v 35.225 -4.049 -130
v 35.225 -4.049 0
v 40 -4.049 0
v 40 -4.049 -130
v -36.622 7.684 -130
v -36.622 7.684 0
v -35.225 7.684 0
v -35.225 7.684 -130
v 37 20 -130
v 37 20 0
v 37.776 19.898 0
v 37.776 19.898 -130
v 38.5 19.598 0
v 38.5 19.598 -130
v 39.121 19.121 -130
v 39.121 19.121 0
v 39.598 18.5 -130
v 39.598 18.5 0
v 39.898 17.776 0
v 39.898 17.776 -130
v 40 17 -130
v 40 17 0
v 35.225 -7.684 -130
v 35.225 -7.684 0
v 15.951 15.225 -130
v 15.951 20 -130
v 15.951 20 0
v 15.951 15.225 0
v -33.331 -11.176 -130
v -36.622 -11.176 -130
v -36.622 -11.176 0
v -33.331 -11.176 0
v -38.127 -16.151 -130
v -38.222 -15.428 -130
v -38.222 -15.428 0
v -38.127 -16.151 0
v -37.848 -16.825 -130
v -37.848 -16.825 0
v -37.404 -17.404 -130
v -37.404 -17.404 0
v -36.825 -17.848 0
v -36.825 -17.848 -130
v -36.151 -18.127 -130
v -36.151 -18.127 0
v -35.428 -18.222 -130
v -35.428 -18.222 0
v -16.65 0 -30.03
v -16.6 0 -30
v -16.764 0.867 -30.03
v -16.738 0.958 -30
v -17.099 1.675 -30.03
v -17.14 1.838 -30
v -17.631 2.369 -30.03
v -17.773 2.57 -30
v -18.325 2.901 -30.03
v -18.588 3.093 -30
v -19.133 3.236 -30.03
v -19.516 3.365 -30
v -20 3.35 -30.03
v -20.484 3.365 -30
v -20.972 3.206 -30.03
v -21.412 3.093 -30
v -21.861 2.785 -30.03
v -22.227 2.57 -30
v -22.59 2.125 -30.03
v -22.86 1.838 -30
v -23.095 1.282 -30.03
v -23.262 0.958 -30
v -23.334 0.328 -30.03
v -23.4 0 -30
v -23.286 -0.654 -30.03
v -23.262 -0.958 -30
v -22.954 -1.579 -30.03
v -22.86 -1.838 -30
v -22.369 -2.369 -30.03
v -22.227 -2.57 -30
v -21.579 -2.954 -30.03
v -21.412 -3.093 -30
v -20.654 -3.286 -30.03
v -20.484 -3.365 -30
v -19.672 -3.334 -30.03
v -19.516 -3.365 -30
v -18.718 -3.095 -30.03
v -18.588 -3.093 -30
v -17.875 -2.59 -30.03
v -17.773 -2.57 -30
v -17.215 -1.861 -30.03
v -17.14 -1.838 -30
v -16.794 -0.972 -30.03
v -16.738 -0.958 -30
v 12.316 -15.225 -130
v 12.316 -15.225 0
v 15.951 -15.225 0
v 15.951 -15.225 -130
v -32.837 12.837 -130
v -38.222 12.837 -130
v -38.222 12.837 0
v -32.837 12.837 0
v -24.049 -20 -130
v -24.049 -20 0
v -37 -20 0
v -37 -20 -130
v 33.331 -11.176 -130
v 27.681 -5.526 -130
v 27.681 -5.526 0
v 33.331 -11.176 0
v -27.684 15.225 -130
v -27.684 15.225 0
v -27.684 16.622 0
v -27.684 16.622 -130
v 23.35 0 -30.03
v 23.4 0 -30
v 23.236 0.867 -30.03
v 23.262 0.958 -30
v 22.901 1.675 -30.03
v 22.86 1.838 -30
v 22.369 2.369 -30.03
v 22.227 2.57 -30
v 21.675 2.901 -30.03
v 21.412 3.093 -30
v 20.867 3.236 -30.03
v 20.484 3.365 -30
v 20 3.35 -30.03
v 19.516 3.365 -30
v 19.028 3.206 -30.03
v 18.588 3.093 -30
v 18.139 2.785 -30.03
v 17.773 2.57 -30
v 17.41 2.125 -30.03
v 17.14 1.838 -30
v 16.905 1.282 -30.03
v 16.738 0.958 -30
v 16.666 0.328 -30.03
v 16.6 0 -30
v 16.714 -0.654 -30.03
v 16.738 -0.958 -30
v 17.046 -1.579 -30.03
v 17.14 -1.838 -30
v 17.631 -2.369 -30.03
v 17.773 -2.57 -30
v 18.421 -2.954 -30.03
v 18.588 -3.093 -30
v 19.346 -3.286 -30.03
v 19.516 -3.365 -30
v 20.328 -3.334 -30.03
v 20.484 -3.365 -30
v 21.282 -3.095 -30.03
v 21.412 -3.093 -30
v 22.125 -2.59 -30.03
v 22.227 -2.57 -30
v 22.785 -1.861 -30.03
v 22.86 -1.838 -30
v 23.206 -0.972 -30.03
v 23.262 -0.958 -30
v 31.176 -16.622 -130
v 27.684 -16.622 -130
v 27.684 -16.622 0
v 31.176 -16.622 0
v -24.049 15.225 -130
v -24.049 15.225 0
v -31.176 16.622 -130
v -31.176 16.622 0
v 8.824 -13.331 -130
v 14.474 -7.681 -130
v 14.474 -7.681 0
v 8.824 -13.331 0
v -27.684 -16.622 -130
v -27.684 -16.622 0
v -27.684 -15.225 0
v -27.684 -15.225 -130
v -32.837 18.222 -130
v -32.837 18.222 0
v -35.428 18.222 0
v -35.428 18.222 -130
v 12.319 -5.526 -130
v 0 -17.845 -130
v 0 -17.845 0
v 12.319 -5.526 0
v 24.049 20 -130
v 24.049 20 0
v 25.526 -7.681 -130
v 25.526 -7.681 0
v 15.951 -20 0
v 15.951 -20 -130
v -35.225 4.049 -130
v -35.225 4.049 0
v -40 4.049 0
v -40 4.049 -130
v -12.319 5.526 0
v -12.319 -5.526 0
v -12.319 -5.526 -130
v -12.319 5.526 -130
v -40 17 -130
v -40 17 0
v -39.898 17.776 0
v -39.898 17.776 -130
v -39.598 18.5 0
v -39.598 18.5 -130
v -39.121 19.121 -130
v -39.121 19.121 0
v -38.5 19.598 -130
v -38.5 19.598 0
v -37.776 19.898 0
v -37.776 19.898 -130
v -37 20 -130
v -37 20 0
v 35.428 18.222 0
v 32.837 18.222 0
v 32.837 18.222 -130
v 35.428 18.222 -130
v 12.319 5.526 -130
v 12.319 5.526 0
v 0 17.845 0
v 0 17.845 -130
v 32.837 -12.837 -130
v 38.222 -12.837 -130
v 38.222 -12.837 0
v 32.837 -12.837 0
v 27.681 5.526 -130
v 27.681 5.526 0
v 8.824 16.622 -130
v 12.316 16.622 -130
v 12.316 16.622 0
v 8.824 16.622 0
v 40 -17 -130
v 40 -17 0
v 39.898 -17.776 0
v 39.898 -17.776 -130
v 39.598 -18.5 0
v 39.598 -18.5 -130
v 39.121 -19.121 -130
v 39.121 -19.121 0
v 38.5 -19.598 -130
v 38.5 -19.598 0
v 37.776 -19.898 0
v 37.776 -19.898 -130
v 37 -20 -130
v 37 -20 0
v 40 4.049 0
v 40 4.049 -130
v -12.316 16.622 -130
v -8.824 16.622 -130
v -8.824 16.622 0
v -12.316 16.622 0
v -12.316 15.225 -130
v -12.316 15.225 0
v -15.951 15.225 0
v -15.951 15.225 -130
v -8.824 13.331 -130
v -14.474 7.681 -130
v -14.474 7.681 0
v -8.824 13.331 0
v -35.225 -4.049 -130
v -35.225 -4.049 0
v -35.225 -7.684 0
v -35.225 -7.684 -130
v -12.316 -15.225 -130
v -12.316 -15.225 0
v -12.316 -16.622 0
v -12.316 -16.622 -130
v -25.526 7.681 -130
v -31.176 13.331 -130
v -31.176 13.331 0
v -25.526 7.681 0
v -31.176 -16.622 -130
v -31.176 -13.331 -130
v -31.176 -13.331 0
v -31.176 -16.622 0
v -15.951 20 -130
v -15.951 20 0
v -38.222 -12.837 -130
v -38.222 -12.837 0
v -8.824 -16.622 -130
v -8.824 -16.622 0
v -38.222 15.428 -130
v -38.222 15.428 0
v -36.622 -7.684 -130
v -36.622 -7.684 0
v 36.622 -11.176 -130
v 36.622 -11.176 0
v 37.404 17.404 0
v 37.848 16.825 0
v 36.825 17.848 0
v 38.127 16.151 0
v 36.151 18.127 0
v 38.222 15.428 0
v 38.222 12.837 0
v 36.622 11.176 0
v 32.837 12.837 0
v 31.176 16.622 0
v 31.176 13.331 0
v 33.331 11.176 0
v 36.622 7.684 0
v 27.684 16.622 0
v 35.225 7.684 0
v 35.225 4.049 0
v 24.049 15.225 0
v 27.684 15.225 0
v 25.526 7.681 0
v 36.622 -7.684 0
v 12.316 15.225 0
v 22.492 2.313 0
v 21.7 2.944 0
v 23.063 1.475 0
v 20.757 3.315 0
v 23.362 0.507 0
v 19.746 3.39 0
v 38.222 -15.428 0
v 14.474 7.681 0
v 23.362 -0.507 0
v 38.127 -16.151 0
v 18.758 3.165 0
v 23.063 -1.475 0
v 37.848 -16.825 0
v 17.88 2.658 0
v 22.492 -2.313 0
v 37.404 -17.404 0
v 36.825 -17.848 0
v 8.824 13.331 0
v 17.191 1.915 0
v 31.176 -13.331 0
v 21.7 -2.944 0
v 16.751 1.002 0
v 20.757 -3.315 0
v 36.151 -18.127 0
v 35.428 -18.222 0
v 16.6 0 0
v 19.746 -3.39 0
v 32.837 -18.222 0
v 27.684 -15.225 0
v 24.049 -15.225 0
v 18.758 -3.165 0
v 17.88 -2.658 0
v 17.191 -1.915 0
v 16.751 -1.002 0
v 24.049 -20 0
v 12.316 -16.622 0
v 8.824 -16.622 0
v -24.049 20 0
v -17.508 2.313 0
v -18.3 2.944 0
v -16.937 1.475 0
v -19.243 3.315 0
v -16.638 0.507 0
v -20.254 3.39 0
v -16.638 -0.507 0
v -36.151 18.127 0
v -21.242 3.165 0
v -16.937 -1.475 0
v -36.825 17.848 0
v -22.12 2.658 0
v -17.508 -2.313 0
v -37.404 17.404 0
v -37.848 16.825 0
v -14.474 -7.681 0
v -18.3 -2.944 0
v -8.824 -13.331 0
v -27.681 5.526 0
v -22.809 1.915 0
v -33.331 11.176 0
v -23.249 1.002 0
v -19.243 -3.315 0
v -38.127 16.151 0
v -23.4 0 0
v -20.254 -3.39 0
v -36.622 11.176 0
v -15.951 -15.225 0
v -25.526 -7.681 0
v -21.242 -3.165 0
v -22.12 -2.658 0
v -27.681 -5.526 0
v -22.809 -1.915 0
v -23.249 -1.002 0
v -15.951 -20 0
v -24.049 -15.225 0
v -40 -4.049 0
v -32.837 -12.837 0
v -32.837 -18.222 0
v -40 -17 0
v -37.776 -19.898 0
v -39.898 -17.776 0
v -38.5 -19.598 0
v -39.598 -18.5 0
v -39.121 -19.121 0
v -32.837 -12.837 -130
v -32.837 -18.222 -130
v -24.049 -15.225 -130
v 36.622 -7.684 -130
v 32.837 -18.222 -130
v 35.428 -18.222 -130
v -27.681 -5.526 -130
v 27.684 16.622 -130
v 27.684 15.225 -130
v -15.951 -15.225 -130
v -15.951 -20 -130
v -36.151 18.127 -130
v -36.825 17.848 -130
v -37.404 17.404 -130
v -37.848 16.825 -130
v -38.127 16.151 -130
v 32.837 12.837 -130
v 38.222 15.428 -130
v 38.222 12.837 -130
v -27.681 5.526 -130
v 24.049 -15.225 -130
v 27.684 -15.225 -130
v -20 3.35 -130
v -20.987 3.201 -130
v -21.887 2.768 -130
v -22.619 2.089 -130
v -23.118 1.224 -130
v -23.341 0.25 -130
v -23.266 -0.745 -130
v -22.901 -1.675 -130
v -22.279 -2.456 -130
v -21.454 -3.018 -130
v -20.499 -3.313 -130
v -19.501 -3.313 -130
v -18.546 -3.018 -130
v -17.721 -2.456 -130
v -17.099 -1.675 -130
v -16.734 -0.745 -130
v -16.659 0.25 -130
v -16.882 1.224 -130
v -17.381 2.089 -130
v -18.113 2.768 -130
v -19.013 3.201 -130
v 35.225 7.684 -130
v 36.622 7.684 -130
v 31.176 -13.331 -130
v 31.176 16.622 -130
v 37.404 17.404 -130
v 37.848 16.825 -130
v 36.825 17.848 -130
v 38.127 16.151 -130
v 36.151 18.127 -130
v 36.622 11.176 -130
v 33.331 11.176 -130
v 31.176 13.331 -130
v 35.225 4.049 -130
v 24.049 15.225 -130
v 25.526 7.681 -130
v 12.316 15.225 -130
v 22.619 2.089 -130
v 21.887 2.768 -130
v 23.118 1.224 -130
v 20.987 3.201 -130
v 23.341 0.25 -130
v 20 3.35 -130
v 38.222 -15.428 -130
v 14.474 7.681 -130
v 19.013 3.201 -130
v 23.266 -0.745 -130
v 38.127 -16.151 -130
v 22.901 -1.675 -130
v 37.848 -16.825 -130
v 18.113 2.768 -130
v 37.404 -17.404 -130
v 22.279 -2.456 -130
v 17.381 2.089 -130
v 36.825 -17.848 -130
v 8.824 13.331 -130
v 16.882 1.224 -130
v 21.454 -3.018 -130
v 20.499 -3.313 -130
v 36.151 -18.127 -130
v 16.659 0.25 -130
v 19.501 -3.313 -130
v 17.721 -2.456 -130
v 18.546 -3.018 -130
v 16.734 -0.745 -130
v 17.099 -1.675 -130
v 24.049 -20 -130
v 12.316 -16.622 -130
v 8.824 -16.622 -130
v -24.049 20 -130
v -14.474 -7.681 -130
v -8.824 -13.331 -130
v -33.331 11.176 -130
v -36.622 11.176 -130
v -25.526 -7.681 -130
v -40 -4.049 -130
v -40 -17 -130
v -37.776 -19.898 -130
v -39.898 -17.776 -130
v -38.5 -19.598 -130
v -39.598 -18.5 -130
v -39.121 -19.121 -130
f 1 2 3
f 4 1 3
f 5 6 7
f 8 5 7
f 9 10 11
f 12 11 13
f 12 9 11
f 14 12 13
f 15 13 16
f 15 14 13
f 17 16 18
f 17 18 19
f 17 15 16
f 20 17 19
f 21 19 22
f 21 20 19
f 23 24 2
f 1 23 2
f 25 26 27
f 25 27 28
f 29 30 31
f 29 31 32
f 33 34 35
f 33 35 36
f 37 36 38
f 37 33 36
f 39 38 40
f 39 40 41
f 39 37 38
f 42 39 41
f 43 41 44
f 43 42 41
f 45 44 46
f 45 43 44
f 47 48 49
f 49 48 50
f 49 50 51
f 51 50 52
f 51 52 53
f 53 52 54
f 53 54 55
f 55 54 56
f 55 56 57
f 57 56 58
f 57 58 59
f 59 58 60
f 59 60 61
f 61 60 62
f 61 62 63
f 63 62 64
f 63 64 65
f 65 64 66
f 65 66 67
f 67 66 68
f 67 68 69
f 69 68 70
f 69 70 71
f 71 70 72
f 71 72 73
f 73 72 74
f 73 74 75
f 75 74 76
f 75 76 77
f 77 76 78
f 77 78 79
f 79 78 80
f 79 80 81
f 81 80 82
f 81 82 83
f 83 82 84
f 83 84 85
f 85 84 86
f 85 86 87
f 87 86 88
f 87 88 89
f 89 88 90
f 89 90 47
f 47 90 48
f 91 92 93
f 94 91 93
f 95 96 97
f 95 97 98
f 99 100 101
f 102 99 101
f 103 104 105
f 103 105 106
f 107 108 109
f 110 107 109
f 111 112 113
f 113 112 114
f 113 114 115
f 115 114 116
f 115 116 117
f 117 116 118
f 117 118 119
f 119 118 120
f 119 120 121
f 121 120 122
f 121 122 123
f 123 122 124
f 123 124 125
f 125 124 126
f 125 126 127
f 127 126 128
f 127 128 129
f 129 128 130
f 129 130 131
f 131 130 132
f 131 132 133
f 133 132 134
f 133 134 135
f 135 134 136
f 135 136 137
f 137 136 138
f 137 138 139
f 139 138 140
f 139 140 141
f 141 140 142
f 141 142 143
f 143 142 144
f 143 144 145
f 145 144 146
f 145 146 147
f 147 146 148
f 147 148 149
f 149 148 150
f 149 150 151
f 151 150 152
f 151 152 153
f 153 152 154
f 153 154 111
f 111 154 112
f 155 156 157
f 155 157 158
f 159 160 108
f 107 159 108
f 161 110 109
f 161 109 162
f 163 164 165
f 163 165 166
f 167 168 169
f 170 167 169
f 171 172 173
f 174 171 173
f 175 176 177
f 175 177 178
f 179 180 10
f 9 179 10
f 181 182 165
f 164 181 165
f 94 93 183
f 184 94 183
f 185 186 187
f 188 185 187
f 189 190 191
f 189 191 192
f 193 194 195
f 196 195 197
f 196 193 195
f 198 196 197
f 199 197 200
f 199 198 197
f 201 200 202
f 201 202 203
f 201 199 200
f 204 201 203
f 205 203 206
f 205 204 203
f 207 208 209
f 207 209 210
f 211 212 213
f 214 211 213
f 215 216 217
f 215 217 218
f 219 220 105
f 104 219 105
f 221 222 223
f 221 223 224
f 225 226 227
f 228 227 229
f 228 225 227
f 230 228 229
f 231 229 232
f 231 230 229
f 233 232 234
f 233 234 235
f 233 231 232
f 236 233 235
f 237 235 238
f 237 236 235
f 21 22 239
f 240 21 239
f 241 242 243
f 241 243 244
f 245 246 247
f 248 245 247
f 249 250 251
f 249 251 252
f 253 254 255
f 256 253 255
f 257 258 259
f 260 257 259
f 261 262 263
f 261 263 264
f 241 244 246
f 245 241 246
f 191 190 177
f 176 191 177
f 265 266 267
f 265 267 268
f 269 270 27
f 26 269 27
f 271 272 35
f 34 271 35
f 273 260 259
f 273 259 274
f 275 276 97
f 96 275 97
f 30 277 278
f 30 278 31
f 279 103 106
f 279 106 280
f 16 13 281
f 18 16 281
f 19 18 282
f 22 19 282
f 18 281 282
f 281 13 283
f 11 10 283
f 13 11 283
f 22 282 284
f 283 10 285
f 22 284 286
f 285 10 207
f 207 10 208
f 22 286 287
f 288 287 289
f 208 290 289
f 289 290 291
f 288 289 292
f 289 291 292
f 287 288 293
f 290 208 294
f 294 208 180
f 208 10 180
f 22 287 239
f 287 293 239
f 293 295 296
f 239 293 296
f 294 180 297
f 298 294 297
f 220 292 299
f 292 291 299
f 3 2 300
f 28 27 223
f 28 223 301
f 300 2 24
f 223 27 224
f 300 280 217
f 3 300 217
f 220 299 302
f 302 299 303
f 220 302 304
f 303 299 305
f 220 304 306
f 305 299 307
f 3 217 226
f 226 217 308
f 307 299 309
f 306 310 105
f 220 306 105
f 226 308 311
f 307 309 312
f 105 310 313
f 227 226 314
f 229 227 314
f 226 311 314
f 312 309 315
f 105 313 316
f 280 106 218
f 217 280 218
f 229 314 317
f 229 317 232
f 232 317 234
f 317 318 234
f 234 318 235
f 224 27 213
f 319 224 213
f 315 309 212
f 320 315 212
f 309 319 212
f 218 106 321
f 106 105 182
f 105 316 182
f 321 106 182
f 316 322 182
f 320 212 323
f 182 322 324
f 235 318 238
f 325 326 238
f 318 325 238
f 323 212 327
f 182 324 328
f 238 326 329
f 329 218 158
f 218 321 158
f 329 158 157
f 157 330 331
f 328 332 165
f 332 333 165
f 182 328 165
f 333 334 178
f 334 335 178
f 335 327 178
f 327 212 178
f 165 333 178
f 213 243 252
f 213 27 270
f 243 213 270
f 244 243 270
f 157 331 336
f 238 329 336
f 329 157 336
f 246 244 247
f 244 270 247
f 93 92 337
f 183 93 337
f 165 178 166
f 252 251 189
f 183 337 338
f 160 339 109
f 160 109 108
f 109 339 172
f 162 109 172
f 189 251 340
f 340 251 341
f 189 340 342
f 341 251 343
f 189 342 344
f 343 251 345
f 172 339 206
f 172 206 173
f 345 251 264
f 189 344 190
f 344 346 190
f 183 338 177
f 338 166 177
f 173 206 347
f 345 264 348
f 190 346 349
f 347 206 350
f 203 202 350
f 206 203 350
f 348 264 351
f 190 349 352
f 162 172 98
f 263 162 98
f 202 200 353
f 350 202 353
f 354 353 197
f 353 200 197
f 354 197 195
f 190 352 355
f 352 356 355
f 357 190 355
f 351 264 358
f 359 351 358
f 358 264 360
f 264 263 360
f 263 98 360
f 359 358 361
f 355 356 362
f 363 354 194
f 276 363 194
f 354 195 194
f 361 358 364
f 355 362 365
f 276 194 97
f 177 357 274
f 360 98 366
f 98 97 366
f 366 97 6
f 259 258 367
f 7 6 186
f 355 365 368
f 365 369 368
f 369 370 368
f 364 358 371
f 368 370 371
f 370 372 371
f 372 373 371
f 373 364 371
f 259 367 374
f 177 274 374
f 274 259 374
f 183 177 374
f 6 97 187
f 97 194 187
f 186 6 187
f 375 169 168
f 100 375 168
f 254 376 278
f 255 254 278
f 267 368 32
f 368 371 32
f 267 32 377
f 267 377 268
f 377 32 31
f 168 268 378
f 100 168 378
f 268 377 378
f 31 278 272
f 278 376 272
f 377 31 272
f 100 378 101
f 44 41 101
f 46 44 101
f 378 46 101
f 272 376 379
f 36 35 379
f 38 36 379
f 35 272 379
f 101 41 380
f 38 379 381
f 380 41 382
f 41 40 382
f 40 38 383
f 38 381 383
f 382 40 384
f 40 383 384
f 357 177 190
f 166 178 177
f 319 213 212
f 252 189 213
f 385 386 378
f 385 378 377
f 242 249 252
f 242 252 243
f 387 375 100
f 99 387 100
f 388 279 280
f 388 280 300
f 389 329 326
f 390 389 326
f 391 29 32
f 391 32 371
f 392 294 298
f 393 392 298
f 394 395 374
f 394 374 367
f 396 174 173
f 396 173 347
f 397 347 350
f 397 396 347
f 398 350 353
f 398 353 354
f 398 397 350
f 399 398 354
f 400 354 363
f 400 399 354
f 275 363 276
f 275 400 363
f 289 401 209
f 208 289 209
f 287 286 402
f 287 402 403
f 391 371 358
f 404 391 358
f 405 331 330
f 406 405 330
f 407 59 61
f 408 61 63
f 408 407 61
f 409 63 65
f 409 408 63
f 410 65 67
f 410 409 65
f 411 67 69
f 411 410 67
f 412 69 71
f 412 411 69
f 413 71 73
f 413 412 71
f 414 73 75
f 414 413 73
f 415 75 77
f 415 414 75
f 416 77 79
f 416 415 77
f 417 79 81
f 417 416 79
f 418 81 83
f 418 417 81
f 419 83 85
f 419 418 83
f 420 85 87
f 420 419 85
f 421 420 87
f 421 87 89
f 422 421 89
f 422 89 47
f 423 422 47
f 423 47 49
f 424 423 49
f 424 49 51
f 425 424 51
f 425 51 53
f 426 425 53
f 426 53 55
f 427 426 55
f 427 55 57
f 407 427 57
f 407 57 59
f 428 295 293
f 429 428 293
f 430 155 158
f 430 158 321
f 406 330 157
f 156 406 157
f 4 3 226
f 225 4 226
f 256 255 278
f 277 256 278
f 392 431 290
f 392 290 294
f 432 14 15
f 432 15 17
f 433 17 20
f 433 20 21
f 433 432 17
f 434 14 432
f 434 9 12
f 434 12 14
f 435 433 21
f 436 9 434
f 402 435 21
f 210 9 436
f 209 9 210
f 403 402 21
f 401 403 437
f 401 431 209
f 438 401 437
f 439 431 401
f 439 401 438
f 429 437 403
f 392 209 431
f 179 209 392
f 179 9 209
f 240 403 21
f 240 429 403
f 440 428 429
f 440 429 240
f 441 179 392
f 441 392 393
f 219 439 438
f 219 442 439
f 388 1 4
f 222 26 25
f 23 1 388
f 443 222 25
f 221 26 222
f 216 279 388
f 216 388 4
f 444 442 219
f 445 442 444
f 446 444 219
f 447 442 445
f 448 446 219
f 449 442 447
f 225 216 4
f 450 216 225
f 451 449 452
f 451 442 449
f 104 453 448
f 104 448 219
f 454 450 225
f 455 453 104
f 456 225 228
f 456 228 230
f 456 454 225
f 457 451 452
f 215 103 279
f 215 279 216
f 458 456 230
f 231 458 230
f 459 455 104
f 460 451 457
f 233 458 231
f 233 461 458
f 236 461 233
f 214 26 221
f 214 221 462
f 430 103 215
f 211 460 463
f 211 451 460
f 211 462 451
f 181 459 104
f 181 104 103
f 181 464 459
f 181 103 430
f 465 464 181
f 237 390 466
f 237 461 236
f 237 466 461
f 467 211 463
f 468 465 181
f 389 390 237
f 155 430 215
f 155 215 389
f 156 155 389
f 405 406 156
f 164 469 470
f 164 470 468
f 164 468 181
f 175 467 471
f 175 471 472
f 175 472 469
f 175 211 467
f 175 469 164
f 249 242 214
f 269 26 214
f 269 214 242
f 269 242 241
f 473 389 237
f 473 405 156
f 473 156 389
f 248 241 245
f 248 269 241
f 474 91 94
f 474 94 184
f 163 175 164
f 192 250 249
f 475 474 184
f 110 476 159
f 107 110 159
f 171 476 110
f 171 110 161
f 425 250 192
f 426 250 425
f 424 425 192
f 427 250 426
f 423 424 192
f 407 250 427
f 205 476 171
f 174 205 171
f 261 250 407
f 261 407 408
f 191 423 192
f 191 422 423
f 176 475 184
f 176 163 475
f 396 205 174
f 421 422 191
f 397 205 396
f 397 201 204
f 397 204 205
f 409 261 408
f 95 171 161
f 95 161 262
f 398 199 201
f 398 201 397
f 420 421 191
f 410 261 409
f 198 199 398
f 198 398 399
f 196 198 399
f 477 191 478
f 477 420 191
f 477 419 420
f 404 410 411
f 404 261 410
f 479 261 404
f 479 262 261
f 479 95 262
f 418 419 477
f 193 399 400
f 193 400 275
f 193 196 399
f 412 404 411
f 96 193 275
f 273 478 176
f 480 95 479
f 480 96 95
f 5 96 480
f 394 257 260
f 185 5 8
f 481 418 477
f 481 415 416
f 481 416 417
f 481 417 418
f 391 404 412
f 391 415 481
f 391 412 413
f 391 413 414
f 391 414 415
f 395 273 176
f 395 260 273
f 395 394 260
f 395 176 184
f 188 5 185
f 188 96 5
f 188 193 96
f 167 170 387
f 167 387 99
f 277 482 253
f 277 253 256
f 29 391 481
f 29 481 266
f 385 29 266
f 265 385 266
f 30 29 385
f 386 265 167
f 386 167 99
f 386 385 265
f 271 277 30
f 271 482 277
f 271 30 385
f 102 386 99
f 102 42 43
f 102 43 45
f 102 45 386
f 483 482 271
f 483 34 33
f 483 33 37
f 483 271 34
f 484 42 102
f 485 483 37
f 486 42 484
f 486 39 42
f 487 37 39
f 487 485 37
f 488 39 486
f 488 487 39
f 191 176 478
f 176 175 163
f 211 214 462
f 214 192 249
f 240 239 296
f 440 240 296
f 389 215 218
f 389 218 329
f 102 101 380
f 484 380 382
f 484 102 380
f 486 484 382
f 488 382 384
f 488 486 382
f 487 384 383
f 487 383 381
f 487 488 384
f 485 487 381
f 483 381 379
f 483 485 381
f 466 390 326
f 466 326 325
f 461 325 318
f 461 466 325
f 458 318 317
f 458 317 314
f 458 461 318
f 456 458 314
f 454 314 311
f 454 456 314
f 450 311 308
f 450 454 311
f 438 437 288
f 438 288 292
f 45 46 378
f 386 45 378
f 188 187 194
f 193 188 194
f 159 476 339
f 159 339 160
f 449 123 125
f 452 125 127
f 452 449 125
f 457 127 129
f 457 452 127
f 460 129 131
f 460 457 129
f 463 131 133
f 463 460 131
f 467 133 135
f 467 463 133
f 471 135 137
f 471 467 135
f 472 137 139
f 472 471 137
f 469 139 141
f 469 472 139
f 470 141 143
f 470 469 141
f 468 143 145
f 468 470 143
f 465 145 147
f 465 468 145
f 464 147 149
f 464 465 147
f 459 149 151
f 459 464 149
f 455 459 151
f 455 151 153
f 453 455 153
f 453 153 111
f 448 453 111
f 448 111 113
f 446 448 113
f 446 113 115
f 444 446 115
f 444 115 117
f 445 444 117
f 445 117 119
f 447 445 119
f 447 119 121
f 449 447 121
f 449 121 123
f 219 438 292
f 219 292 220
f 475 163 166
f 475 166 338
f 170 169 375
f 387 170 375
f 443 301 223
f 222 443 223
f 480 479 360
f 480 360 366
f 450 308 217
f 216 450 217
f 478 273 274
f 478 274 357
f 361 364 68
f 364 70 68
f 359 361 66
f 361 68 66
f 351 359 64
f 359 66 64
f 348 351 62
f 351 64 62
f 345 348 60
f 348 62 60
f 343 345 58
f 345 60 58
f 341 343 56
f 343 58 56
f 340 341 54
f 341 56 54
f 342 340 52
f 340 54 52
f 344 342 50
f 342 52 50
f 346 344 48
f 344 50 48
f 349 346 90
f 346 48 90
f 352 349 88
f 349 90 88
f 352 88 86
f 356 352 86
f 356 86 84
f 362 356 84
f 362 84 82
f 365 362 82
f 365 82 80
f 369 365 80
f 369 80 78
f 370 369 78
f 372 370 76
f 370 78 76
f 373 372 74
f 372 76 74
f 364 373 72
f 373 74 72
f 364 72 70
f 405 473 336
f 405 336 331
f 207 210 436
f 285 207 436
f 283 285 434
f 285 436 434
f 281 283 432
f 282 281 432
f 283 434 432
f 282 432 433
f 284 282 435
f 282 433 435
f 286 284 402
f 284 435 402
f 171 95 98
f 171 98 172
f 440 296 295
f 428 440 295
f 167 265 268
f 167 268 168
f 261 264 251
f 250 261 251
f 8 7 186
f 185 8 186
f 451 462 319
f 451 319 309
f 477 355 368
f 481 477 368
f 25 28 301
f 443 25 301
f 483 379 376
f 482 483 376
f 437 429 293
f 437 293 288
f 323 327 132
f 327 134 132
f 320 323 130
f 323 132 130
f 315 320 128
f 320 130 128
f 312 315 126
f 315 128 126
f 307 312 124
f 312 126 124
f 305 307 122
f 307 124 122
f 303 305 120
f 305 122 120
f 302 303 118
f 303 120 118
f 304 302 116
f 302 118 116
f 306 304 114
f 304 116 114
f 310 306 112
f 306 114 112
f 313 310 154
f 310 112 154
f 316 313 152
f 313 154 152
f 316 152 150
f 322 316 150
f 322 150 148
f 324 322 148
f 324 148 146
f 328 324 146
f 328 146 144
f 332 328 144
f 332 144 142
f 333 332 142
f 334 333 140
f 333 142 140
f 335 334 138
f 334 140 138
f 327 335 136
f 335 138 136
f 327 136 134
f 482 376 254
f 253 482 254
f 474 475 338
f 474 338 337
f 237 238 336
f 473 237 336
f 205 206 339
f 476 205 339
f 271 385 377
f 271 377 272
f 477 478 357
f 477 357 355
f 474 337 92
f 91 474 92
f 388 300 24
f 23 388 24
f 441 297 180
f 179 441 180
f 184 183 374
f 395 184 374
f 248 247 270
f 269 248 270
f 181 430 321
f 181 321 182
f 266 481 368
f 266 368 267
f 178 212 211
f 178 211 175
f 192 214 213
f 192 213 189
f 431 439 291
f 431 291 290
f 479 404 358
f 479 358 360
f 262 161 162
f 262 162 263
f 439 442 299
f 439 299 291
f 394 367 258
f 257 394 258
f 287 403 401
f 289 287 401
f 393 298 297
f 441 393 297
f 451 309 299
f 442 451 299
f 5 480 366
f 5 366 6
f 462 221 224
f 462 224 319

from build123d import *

# Parameters (mm, degrees)
SKETCH2_R                            = 3.35
F_40_SERIES_TS40_80LM_650037_1_DEPTH = 130
M8X1_25_TAPPED_HOLE1_D               = 6.8
M8X1_25_TAPPED_HOLE1_DEPTH           = 30
M8X1_25_TAPPED_HOLE1_TIP             = 2.042926105


with BuildPart() as part:
    # Sketch2 → 40 series TS40-80LM-650037(1) (new body)
    with BuildSketch(Plane(origin=(0, 0, -130), x_dir=(0, 1, 0), z_dir=(0, 0, 1))):
        with BuildLine():
            Line((0, -27.681), (-5.525738531, -27.681))
            Line((-5.525738531, -27.681), (-11.176, -33.331261469))
            Line((-11.176, -33.331261469), (-11.176, -36.6218))
            Line((-11.176, -36.6218), (-7.6835, -36.6218))
            Line((-7.6835, -36.6218), (-7.6835, -35.2248))
            Line((-7.6835, -35.2248), (-4.0488, -35.2248))
            Line((-4.0488, -35.2248), (-4.0488, -40))
            Line((-4.0488, -40), (-17, -40))
            ThreePointArc((-17, -40), (-19.121320344, -39.121320344), (-20, -37))
            Line((-20, -37), (-20, -24.0488))
            Line((-20, -24.0488), (-15.2248, -24.0488))
            Line((-15.2248, -24.0488), (-15.2248, -27.6835))
            Line((-15.2248, -27.6835), (-16.6218, -27.6835))
            Line((-16.6218, -27.6835), (-16.6218, -31.176))
            Line((-16.6218, -31.176), (-13.331261469, -31.176))
            Line((-13.331261469, -31.176), (-7.681, -25.525738531))
            Line((-7.681, -25.525738531), (-7.681, -20))
            Line((-7.681, -20), (-7.681, -14.474261469))
            Line((-7.681, -14.474261469), (-13.331261469, -8.824))
            Line((-13.331261469, -8.824), (-16.6218, -8.824))
            Line((-16.6218, -8.824), (-16.6218, -12.3165))
            Line((-16.6218, -12.3165), (-15.2248, -12.3165))
            Line((-15.2248, -12.3165), (-15.2248, -15.9512))
            Line((-15.2248, -15.9512), (-20, -15.9512))
            Line((-20, -15.9512), (-20, 15.9512))
            Line((-20, 15.9512), (-15.2248, 15.9512))
            Line((-15.2248, 15.9512), (-15.2248, 12.3165))
            Line((-15.2248, 12.3165), (-16.6218, 12.3165))
            Line((-16.6218, 12.3165), (-16.6218, 8.824))
            Line((-16.6218, 8.824), (-13.331261469, 8.824))
            Line((-13.331261469, 8.824), (-7.681, 14.474261469))
            Line((-7.681, 14.474261469), (-7.681, 25.525738531))
            Line((-7.681, 25.525738531), (-13.331261469, 31.176))
            Line((-13.331261469, 31.176), (-16.6218, 31.176))
            Line((-16.6218, 31.176), (-16.6218, 27.6835))
            Line((-16.6218, 27.6835), (-15.2248, 27.6835))
            Line((-15.2248, 27.6835), (-15.2248, 24.0488))
            Line((-15.2248, 24.0488), (-20, 24.0488))
            Line((-20, 24.0488), (-20, 37))
            ThreePointArc((-20, 37), (-19.121320344, 39.121320344), (-17, 40))
            Line((-17, 40), (-4.0488, 40))
            Line((-4.0488, 40), (-4.0488, 35.2248))
            Line((-4.0488, 35.2248), (-7.6835, 35.2248))
            Line((-7.6835, 35.2248), (-7.6835, 36.6218))
            Line((-7.6835, 36.6218), (-11.176, 36.6218))
            Line((-11.176, 36.6218), (-11.176, 33.331261469))
            Line((-11.176, 33.331261469), (-5.525738531, 27.681))
            Line((-5.525738531, 27.681), (0, 27.681))
            Line((0, 27.681), (5.525738531, 27.681))
            Line((5.525738531, 27.681), (11.176, 33.331261469))
            Line((11.176, 33.331261469), (11.176, 36.6218))
            Line((11.176, 36.6218), (7.6835, 36.6218))
            Line((7.6835, 36.6218), (7.6835, 35.2248))
            Line((7.6835, 35.2248), (4.0488, 35.2248))
            Line((4.0488, 35.2248), (4.0488, 40))
            Line((4.0488, 40), (17, 40))
            ThreePointArc((17, 40), (19.121320344, 39.121320344), (20, 37))
            Line((20, 37), (20, 24.0488))
            Line((20, 24.0488), (15.2248, 24.0488))
            Line((15.2248, 24.0488), (15.2248, 27.6835))
            Line((15.2248, 27.6835), (16.6218, 27.6835))
            Line((16.6218, 27.6835), (16.6218, 31.176))
            Line((16.6218, 31.176), (13.331261469, 31.176))
            Line((13.331261469, 31.176), (7.681, 25.525738531))
            Line((7.681, 25.525738531), (7.681, 20))
            Line((7.681, 20), (7.681, 14.474261469))
            Line((7.681, 14.474261469), (13.331261469, 8.824))
            Line((13.331261469, 8.824), (16.6218, 8.824))
            Line((16.6218, 8.824), (16.6218, 12.3165))
            Line((16.6218, 12.3165), (15.2248, 12.3165))
            Line((15.2248, 12.3165), (15.2248, 15.9512))
            Line((15.2248, 15.9512), (20, 15.9512))
            Line((20, 15.9512), (20, -15.9512))
            Line((20, -15.9512), (15.2248, -15.9512))
            Line((15.2248, -15.9512), (15.2248, -12.3165))
            Line((15.2248, -12.3165), (16.6218, -12.3165))
            Line((16.6218, -12.3165), (16.6218, -8.824))
            Line((16.6218, -8.824), (13.331261469, -8.824))
            Line((13.331261469, -8.824), (7.681, -14.474261469))
            Line((7.681, -14.474261469), (7.681, -20))
            Line((7.681, -20), (7.681, -25.525738531))
            Line((7.681, -25.525738531), (13.331261469, -31.176))
            Line((13.331261469, -31.176), (16.6218, -31.176))
            Line((16.6218, -31.176), (16.6218, -27.6835))
            Line((16.6218, -27.6835), (15.2248, -27.6835))
            Line((15.2248, -27.6835), (15.2248, -24.0488))
            Line((15.2248, -24.0488), (20, -24.0488))
            Line((20, -24.0488), (20, -37))
            ThreePointArc((20, -37), (19.121320344, -39.121320344), (17, -40))
            Line((17, -40), (4.0488, -40))
            Line((4.0488, -40), (4.0488, -35.2248))
            Line((4.0488, -35.2248), (7.6835, -35.2248))
            Line((7.6835, -35.2248), (7.6835, -36.6218))
            Line((7.6835, -36.6218), (11.176, -36.6218))
            Line((11.176, -36.6218), (11.176, -33.331261469))
            Line((11.176, -33.331261469), (5.525738531, -27.681))
            Line((5.525738531, -27.681), (0, -27.681))
        make_face()
        with Locations((0, -20)):
            Circle(SKETCH2_R, mode=Mode.SUBTRACT)
        with Locations((0, 20)):
            Circle(SKETCH2_R, mode=Mode.SUBTRACT)
        Polygon((-5.525738531, 12.319), (-17.844738531, 0), (-5.525738531, -12.319), (0, -12.319), (5.525738531, -12.319), (17.844738531, 0), (5.525738531, 12.319), (0, 12.319), align=None, mode=Mode.SUBTRACT)
        with BuildLine():
            Line((12.8372, 38.222), (12.8372, 32.8372))
            Line((12.8372, 32.8372), (18.222, 32.8372))
            Line((18.222, 32.8372), (18.222, 35.428))
            ThreePointArc((18.222, 35.428), (17.403656347, 37.403656347), (15.428, 38.222))
            Line((15.428, 38.222), (12.8372, 38.222))
        make_face(mode=Mode.SUBTRACT)
        with BuildLine():
            Line((12.8372, -32.8372), (18.222, -32.8372))
            Line((18.222, -32.8372), (18.222, -35.428))
            ThreePointArc((18.222, -35.428), (17.403656347, -37.403656347), (15.428, -38.222))
            Line((15.428, -38.222), (12.8372, -38.222))
            Line((12.8372, -38.222), (12.8372, -32.8372))
        make_face(mode=Mode.SUBTRACT)
        with BuildLine():
            Line((-12.8372, -38.222), (-12.8372, -32.8372))
            Line((-12.8372, -32.8372), (-18.222, -32.8372))
            Line((-18.222, -32.8372), (-18.222, -35.428))
            ThreePointArc((-18.222, -35.428), (-17.403656347, -37.403656347), (-15.428, -38.222))
            Line((-15.428, -38.222), (-12.8372, -38.222))
        make_face(mode=Mode.SUBTRACT)
        with BuildLine():
            Line((-18.222, 35.428), (-18.222, 32.8372))
            Line((-18.222, 32.8372), (-12.8372, 32.8372))
            Line((-12.8372, 32.8372), (-12.8372, 38.222))
            Line((-12.8372, 38.222), (-15.428, 38.222))
            ThreePointArc((-15.428, 38.222), (-17.403656347, 37.403656347), (-18.222, 35.428))
        make_face(mode=Mode.SUBTRACT)
    extrude(amount=F_40_SERIES_TS40_80LM_650037_1_DEPTH)

    # M8x1.25 Tapped Hole1
    with Locations(Plane.XY):
        with Locations((-20, 0), (20, 0)):
            Hole(M8X1_25_TAPPED_HOLE1_D / 2, depth=M8X1_25_TAPPED_HOLE1_DEPTH)
            with Locations((0, 0, -(M8X1_25_TAPPED_HOLE1_DEPTH + M8X1_25_TAPPED_HOLE1_TIP / 2))):  # 118° drill point
                Cone(0, M8X1_25_TAPPED_HOLE1_D / 2, M8X1_25_TAPPED_HOLE1_TIP, mode=Mode.SUBTRACT)


solid = part.part
